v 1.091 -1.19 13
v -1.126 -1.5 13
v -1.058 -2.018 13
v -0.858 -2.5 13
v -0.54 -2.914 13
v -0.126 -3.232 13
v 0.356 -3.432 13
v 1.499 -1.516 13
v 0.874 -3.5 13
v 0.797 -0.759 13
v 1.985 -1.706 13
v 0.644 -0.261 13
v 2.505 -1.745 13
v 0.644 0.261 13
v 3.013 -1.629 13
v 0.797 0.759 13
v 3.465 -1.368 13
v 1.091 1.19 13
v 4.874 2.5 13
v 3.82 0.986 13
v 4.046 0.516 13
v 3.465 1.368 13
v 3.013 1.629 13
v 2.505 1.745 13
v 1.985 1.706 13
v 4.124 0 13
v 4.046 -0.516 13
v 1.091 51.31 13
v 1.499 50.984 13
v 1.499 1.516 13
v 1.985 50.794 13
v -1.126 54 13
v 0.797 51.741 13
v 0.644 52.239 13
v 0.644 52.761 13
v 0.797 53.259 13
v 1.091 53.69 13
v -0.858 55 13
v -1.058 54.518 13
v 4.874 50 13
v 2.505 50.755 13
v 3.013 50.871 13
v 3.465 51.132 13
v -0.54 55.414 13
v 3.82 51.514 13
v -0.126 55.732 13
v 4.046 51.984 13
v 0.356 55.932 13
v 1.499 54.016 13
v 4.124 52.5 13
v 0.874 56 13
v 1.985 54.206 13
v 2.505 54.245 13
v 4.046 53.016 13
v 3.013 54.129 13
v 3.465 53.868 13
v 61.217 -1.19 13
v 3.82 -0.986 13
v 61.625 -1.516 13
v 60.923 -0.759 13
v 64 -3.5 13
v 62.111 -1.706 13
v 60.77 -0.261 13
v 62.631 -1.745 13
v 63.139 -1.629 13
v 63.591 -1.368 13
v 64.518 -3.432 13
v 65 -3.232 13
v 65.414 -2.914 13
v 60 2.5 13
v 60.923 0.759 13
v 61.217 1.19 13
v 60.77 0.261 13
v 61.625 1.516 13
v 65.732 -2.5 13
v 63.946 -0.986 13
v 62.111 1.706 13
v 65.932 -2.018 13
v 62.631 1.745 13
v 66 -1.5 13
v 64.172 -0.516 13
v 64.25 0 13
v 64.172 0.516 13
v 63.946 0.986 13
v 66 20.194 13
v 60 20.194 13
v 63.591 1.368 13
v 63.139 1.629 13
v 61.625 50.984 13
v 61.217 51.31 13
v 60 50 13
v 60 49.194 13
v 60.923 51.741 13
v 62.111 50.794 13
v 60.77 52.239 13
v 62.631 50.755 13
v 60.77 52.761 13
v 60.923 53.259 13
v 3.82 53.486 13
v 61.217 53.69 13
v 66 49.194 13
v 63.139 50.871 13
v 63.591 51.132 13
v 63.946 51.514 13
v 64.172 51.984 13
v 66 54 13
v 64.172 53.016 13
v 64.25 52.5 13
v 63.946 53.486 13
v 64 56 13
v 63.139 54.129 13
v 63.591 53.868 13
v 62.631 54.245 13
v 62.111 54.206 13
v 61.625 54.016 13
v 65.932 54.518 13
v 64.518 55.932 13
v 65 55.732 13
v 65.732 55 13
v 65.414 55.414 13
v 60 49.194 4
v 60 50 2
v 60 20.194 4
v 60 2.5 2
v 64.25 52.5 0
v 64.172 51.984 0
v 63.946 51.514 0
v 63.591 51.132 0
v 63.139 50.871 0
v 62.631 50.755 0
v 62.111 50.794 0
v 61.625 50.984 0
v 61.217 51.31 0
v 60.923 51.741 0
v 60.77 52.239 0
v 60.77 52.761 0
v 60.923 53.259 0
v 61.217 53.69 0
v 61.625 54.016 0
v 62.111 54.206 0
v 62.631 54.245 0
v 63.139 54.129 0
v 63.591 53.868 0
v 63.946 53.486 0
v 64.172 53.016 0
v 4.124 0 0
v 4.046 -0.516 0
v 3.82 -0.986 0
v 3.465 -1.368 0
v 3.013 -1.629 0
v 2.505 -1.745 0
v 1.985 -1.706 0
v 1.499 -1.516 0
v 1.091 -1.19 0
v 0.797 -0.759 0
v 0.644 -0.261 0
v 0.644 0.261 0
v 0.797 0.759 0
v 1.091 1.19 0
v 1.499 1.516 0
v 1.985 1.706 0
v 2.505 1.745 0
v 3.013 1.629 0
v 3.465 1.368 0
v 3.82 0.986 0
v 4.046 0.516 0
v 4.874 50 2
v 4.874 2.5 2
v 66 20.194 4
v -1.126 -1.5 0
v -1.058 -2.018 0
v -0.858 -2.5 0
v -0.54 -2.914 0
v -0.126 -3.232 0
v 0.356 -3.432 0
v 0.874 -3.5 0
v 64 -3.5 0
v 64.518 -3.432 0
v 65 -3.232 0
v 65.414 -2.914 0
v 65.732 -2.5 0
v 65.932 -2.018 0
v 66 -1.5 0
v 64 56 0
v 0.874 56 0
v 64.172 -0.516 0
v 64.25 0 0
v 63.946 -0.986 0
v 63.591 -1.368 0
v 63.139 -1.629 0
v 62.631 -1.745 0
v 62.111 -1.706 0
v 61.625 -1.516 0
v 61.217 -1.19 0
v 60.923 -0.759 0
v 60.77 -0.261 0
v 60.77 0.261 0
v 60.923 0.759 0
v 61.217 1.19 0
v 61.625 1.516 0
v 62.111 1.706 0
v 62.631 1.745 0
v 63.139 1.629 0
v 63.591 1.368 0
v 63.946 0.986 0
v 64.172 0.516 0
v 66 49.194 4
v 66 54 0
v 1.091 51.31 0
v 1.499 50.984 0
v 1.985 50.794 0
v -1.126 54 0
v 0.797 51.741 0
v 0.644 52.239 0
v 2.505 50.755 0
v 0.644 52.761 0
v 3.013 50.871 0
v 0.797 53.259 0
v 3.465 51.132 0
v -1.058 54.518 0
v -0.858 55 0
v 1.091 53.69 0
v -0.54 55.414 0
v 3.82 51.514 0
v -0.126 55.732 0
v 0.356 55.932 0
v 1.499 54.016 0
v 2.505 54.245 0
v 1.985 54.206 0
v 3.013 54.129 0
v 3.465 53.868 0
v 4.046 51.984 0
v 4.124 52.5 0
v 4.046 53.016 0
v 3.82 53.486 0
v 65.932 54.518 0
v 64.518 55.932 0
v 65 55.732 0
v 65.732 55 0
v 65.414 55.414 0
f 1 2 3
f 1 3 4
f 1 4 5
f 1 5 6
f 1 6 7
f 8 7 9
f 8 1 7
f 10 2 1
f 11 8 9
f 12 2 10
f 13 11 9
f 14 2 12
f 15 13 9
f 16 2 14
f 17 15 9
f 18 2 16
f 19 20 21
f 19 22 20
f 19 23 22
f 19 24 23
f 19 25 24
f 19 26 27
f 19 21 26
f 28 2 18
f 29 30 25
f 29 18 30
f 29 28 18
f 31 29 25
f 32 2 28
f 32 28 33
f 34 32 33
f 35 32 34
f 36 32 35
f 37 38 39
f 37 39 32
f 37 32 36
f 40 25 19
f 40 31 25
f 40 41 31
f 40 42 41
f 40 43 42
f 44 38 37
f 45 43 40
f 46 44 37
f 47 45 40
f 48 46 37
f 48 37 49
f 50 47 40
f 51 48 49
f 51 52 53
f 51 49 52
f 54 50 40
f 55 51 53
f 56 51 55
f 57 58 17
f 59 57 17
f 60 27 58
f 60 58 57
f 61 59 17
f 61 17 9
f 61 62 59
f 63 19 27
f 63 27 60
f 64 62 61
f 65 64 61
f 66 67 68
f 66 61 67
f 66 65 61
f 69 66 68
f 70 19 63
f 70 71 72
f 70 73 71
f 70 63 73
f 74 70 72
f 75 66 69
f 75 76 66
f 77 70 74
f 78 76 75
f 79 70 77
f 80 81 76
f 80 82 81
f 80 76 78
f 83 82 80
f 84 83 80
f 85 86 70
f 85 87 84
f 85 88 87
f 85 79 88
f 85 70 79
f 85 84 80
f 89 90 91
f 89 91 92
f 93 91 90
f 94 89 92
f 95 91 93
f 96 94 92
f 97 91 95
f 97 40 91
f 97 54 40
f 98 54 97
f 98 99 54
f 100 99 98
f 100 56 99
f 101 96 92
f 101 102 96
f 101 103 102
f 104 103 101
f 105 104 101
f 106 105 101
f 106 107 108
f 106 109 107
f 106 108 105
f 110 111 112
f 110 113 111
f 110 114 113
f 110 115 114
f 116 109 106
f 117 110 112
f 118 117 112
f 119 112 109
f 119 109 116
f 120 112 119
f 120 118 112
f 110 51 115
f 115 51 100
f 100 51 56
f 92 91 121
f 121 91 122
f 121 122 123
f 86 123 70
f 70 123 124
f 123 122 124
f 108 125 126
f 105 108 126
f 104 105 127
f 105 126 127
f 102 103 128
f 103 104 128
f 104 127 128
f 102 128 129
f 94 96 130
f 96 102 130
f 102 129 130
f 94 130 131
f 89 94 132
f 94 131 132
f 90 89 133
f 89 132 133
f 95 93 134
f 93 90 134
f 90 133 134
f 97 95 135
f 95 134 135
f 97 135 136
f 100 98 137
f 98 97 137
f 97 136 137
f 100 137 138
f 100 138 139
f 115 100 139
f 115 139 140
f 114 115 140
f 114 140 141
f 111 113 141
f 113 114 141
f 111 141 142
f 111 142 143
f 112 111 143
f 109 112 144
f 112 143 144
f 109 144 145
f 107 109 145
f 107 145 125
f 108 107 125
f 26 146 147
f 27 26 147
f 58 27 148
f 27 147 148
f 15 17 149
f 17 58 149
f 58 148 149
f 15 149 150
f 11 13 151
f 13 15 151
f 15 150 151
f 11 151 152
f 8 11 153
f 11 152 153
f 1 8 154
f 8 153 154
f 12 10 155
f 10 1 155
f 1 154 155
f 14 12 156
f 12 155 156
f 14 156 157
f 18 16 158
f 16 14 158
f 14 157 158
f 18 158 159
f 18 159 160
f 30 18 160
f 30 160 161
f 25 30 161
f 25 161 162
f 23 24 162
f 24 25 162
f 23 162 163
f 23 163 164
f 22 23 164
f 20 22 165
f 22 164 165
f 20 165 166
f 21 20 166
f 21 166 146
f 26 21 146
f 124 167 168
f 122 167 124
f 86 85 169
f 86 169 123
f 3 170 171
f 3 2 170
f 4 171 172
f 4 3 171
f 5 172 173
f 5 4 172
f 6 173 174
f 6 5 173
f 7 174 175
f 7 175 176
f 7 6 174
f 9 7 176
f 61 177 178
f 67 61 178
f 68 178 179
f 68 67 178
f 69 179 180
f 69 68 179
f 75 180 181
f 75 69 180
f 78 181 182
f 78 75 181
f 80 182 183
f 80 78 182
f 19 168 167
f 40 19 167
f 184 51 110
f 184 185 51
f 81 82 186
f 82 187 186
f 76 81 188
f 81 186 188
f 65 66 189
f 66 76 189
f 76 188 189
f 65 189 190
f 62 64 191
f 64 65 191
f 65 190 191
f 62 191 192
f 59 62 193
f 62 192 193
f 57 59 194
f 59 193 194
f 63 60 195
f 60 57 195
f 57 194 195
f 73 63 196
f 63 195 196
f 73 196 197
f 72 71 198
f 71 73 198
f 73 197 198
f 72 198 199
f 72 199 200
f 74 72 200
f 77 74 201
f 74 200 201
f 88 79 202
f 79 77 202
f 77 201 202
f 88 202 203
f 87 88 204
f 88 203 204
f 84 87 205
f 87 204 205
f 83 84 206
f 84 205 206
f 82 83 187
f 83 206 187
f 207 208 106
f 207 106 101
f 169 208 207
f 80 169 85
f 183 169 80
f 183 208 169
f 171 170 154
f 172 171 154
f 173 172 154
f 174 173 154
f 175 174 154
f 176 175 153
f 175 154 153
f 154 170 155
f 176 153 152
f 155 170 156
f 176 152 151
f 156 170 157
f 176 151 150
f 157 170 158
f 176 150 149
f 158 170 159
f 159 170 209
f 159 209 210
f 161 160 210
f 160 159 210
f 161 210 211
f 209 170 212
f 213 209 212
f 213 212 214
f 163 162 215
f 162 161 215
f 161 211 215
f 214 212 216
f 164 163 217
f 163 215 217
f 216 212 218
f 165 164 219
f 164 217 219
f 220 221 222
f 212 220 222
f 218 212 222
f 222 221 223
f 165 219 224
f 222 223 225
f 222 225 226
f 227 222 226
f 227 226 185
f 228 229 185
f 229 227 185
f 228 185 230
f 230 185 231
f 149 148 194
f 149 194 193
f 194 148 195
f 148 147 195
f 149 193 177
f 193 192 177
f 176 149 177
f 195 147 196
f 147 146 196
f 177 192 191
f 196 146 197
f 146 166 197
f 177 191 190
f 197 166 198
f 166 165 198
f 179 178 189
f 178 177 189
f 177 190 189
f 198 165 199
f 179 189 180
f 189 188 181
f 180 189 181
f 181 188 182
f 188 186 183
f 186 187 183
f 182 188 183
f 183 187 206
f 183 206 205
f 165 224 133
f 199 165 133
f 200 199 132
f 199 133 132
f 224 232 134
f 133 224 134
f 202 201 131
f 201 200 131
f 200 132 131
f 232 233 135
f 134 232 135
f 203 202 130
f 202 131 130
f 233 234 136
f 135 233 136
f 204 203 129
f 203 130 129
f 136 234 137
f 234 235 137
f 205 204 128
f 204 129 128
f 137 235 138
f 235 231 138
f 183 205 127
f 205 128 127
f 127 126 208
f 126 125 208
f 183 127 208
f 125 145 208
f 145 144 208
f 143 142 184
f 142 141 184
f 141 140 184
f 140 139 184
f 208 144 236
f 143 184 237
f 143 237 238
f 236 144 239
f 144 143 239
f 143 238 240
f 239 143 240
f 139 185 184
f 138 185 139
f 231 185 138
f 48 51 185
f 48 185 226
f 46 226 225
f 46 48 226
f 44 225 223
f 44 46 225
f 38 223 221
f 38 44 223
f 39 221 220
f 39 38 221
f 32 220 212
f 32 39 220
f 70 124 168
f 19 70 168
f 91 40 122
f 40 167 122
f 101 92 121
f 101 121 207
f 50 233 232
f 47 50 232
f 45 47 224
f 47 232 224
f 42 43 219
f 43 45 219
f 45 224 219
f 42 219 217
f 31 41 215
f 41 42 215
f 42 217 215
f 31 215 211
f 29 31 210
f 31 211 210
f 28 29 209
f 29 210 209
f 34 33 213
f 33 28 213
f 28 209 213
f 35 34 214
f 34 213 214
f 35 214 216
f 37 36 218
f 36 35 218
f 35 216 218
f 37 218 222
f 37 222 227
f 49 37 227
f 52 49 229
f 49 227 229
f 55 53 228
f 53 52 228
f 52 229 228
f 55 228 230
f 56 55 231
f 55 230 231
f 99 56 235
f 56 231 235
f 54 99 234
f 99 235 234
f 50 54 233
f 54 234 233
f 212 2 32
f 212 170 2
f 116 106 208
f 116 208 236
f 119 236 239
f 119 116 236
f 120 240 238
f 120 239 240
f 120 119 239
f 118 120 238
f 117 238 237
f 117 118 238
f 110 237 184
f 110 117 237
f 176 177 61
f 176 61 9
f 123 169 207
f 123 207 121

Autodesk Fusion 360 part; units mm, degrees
sketch "Sketch1" plane through (0, 0, 0) normal (0, 0, 1) x (1, 0, 0)
  line L0 (4.874, 50) -> (60, 50)
  line L1 (60, 50) -> (60, 2.5)
  line L2 (60, 2.5) -> (4.874, 2.5)
  line L3 (4.874, 2.5) -> (4.874, 50)
  line L4 (-1.126, 56) -> (66, 56)
  line L5 (66, 56) -> (66, -3.5)
  line L6 (66, -3.5) -> (-1.126, -3.5)
  line L7 (-1.126, -3.5) -> (-1.126, 56)
  circle A0 centre (2.374, 52.5) radius 1.75
  circle A1 centre (2.374, 0) radius 1.75
  circle A2 centre (62.5, 52.5) radius 1.75
  circle A3 centre (62.5, 0) radius 1.75
  dimension "d1" = 55.126
  dimension "d2" = 47.5
  dimension "d3" = 6
  dimension "d4" = 6
  dimension "d5" = 6
  dimension "d6" = 6
  dimension "d7" = 3.5
  dimension "d8" = 3.5
  dimension "d9" = 3.5
  dimension "d10" = 3.5
  dimension "d11" = 3.5
  dimension "d12" = 3.5
  dimension "d13" = 3.5
  dimension "d14" = 3.5
  dimension "d15" = 3.5
  dimension "d16" = 3.5
  dimension "d17" = 3.5
  dimension "d18" = 3.5
extrude "Extrude1" add sketch "Sketch1" along normal blind 13
extrude "Extrude2" add sketch "Sketch1" along normal blind 2 contours L0 L1 L2 L3
sketch "Sketch2" plane through (0, 0, 13) normal (0, 0, 1) x (-1, 0, 0)
  line L0 (-60, -2.5) -> (-4.874, -2.5)
  line L1 (-4.874, -2.5) -> (-4.874, -50)
  line L2 (-4.874, -50) -> (-60, -50)
  line L3 (-60, -50) -> (-60, -2.5)
  circle A0 centre (-62.5, -52.5) radius 1.75
  circle A1 centre (-2.374, -52.5) radius 1.75
  circle A2 centre (-2.374, 0) radius 1.75
  circle A3 centre (-62.5, 0) radius 1.75
  line L4 (1.126, 3.5) -> (-66, 3.5)
  line L5 (-66, 3.5) -> (-66, -56)
  line L6 (-66, -56) -> (1.126, -56)
  line L7 (1.126, -56) -> (1.126, 3.5)
  line L8 (-60, -49.1938) -> (-66, -49.1938)
  line L9 (-66, -49.1938) -> (-66, -20.1938)
  line L10 (-66, -20.1938) -> (-60, -20.1938)
  line L11 (-60, -20.1938) -> (-60, -49.1938)
  dimension "d23" = 29
extrude "Extrude3" cut sketch "Sketch2" against normal blind 9 contours L3 L5 L8 L9 L10 L11
fillet "Fillet1" radius 2 4 edges at (-1.126, 56, 6.5) (-1.126, -3.5, 6.5) (66, -3.5, 6.5) (66, 56, 6.5)
